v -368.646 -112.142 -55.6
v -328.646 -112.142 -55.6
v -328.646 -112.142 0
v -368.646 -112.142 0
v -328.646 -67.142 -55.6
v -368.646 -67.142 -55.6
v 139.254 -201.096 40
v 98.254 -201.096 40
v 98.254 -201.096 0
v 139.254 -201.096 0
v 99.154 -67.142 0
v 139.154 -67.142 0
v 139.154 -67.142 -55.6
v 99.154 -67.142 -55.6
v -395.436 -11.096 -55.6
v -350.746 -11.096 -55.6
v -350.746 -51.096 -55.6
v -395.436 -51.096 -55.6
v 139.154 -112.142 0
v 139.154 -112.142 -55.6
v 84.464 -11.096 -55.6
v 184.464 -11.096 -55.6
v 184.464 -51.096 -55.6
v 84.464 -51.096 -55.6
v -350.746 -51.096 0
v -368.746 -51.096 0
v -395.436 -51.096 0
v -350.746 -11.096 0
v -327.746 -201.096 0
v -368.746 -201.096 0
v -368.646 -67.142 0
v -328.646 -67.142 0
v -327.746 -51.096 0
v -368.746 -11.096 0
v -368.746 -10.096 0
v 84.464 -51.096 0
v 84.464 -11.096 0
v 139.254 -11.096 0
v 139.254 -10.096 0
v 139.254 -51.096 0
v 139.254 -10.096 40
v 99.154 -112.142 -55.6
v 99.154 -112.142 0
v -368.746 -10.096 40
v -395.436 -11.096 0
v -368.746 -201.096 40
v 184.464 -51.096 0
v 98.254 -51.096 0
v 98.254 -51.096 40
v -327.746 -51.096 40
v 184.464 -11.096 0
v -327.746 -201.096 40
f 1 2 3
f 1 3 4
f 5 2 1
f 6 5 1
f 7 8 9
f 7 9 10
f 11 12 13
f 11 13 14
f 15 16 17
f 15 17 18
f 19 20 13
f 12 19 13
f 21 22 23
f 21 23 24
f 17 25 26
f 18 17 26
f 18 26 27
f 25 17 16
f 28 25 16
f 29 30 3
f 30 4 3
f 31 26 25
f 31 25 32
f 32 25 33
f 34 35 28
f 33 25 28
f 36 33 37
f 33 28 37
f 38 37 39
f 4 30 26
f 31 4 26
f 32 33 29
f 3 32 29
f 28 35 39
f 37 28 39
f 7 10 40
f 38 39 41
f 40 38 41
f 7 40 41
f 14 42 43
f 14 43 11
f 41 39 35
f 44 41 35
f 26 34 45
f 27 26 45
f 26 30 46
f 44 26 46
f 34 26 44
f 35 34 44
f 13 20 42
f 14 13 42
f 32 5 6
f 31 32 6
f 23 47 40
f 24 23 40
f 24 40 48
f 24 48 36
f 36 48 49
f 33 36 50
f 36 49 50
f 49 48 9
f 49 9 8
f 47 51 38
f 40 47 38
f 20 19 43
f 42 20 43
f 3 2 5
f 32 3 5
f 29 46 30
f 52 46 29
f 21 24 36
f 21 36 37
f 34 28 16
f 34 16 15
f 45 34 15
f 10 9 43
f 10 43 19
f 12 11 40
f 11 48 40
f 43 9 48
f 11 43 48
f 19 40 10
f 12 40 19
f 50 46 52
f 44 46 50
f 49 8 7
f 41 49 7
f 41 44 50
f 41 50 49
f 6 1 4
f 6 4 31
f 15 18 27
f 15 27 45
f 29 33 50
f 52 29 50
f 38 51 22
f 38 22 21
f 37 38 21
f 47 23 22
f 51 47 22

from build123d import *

# Parameters (mm, degrees)
SKETCH2_W           = 254
SKETCH2_H           = 41
BOSS_EXTRUDE1_DEPTH = 40
SKETCH3_W           = 44.69
SKETCH3_H           = 40
BOSS_EXTRUDE6_DEPTH = 55.6
SKETCH7_W           = 100
SKETCH7_H           = 40
BOSS_EXTRUDE7_DEPTH = 55.6
SKETCH8_W           = 41
SKETCH8_H           = 40
BOSS_EXTRUDE8_DEPTH = 150
SKETCH9_W           = 40
SKETCH9_H           = 45
BOSS_EXTRUDE9_DEPTH = 55.6


with BuildPart() as part:
    # Sketch2 → Boss-Extrude1 (new body)
    with BuildSketch(Plane.XY):
        with Locations((-241.745614035, -30.596491228)):
            Rectangle(SKETCH2_W, SKETCH2_H)
        with Locations((12.254385965, -30.596491228)):
            Rectangle(SKETCH2_W, SKETCH2_H)
    extrude(amount=BOSS_EXTRUDE1_DEPTH)

    # Sketch3 → Boss-Extrude6 (add)
    with BuildSketch(Plane(origin=(0, 0, 0), x_dir=(-1, 0, 0), z_dir=(0, 0, -1))):
        with Locations((373.090614035, -31.096491228)):
            Rectangle(SKETCH3_W, SKETCH3_H)
    extrude(amount=BOSS_EXTRUDE6_DEPTH)

    # Sketch7 → Boss-Extrude7 (add)
    with BuildSketch(Plane(origin=(0, 0, 0), x_dir=(-1, 0, 0), z_dir=(0, 0, -1))):
        with Locations((-134.464385965, -31.096491228)):
            Rectangle(SKETCH7_W, SKETCH7_H)
    extrude(amount=BOSS_EXTRUDE7_DEPTH)

    # Sketch8 → Boss-Extrude8 (add)
    with BuildSketch(Plane.XZ.offset(51.096491228)):
        with Locations((118.754385965, 20)):
            Rectangle(SKETCH8_W, SKETCH8_H)
        with Locations((-348.245614035, 20)):
            Rectangle(SKETCH8_W, SKETCH8_H)
    extrude(amount=BOSS_EXTRUDE8_DEPTH)

    # Sketch9 → Boss-Extrude9 (add)
    with BuildSketch(Plane(origin=(0, 0, 0), x_dir=(-1, 0, 0), z_dir=(0, 0, -1))):
        with Locations((-119.154385965, -89.642057698)):
            Rectangle(SKETCH9_W, SKETCH9_H)
        with Locations((348.645614035, -89.642057698)):
            Rectangle(SKETCH9_W, SKETCH9_H)
    extrude(amount=BOSS_EXTRUDE9_DEPTH)


solid = part.part
